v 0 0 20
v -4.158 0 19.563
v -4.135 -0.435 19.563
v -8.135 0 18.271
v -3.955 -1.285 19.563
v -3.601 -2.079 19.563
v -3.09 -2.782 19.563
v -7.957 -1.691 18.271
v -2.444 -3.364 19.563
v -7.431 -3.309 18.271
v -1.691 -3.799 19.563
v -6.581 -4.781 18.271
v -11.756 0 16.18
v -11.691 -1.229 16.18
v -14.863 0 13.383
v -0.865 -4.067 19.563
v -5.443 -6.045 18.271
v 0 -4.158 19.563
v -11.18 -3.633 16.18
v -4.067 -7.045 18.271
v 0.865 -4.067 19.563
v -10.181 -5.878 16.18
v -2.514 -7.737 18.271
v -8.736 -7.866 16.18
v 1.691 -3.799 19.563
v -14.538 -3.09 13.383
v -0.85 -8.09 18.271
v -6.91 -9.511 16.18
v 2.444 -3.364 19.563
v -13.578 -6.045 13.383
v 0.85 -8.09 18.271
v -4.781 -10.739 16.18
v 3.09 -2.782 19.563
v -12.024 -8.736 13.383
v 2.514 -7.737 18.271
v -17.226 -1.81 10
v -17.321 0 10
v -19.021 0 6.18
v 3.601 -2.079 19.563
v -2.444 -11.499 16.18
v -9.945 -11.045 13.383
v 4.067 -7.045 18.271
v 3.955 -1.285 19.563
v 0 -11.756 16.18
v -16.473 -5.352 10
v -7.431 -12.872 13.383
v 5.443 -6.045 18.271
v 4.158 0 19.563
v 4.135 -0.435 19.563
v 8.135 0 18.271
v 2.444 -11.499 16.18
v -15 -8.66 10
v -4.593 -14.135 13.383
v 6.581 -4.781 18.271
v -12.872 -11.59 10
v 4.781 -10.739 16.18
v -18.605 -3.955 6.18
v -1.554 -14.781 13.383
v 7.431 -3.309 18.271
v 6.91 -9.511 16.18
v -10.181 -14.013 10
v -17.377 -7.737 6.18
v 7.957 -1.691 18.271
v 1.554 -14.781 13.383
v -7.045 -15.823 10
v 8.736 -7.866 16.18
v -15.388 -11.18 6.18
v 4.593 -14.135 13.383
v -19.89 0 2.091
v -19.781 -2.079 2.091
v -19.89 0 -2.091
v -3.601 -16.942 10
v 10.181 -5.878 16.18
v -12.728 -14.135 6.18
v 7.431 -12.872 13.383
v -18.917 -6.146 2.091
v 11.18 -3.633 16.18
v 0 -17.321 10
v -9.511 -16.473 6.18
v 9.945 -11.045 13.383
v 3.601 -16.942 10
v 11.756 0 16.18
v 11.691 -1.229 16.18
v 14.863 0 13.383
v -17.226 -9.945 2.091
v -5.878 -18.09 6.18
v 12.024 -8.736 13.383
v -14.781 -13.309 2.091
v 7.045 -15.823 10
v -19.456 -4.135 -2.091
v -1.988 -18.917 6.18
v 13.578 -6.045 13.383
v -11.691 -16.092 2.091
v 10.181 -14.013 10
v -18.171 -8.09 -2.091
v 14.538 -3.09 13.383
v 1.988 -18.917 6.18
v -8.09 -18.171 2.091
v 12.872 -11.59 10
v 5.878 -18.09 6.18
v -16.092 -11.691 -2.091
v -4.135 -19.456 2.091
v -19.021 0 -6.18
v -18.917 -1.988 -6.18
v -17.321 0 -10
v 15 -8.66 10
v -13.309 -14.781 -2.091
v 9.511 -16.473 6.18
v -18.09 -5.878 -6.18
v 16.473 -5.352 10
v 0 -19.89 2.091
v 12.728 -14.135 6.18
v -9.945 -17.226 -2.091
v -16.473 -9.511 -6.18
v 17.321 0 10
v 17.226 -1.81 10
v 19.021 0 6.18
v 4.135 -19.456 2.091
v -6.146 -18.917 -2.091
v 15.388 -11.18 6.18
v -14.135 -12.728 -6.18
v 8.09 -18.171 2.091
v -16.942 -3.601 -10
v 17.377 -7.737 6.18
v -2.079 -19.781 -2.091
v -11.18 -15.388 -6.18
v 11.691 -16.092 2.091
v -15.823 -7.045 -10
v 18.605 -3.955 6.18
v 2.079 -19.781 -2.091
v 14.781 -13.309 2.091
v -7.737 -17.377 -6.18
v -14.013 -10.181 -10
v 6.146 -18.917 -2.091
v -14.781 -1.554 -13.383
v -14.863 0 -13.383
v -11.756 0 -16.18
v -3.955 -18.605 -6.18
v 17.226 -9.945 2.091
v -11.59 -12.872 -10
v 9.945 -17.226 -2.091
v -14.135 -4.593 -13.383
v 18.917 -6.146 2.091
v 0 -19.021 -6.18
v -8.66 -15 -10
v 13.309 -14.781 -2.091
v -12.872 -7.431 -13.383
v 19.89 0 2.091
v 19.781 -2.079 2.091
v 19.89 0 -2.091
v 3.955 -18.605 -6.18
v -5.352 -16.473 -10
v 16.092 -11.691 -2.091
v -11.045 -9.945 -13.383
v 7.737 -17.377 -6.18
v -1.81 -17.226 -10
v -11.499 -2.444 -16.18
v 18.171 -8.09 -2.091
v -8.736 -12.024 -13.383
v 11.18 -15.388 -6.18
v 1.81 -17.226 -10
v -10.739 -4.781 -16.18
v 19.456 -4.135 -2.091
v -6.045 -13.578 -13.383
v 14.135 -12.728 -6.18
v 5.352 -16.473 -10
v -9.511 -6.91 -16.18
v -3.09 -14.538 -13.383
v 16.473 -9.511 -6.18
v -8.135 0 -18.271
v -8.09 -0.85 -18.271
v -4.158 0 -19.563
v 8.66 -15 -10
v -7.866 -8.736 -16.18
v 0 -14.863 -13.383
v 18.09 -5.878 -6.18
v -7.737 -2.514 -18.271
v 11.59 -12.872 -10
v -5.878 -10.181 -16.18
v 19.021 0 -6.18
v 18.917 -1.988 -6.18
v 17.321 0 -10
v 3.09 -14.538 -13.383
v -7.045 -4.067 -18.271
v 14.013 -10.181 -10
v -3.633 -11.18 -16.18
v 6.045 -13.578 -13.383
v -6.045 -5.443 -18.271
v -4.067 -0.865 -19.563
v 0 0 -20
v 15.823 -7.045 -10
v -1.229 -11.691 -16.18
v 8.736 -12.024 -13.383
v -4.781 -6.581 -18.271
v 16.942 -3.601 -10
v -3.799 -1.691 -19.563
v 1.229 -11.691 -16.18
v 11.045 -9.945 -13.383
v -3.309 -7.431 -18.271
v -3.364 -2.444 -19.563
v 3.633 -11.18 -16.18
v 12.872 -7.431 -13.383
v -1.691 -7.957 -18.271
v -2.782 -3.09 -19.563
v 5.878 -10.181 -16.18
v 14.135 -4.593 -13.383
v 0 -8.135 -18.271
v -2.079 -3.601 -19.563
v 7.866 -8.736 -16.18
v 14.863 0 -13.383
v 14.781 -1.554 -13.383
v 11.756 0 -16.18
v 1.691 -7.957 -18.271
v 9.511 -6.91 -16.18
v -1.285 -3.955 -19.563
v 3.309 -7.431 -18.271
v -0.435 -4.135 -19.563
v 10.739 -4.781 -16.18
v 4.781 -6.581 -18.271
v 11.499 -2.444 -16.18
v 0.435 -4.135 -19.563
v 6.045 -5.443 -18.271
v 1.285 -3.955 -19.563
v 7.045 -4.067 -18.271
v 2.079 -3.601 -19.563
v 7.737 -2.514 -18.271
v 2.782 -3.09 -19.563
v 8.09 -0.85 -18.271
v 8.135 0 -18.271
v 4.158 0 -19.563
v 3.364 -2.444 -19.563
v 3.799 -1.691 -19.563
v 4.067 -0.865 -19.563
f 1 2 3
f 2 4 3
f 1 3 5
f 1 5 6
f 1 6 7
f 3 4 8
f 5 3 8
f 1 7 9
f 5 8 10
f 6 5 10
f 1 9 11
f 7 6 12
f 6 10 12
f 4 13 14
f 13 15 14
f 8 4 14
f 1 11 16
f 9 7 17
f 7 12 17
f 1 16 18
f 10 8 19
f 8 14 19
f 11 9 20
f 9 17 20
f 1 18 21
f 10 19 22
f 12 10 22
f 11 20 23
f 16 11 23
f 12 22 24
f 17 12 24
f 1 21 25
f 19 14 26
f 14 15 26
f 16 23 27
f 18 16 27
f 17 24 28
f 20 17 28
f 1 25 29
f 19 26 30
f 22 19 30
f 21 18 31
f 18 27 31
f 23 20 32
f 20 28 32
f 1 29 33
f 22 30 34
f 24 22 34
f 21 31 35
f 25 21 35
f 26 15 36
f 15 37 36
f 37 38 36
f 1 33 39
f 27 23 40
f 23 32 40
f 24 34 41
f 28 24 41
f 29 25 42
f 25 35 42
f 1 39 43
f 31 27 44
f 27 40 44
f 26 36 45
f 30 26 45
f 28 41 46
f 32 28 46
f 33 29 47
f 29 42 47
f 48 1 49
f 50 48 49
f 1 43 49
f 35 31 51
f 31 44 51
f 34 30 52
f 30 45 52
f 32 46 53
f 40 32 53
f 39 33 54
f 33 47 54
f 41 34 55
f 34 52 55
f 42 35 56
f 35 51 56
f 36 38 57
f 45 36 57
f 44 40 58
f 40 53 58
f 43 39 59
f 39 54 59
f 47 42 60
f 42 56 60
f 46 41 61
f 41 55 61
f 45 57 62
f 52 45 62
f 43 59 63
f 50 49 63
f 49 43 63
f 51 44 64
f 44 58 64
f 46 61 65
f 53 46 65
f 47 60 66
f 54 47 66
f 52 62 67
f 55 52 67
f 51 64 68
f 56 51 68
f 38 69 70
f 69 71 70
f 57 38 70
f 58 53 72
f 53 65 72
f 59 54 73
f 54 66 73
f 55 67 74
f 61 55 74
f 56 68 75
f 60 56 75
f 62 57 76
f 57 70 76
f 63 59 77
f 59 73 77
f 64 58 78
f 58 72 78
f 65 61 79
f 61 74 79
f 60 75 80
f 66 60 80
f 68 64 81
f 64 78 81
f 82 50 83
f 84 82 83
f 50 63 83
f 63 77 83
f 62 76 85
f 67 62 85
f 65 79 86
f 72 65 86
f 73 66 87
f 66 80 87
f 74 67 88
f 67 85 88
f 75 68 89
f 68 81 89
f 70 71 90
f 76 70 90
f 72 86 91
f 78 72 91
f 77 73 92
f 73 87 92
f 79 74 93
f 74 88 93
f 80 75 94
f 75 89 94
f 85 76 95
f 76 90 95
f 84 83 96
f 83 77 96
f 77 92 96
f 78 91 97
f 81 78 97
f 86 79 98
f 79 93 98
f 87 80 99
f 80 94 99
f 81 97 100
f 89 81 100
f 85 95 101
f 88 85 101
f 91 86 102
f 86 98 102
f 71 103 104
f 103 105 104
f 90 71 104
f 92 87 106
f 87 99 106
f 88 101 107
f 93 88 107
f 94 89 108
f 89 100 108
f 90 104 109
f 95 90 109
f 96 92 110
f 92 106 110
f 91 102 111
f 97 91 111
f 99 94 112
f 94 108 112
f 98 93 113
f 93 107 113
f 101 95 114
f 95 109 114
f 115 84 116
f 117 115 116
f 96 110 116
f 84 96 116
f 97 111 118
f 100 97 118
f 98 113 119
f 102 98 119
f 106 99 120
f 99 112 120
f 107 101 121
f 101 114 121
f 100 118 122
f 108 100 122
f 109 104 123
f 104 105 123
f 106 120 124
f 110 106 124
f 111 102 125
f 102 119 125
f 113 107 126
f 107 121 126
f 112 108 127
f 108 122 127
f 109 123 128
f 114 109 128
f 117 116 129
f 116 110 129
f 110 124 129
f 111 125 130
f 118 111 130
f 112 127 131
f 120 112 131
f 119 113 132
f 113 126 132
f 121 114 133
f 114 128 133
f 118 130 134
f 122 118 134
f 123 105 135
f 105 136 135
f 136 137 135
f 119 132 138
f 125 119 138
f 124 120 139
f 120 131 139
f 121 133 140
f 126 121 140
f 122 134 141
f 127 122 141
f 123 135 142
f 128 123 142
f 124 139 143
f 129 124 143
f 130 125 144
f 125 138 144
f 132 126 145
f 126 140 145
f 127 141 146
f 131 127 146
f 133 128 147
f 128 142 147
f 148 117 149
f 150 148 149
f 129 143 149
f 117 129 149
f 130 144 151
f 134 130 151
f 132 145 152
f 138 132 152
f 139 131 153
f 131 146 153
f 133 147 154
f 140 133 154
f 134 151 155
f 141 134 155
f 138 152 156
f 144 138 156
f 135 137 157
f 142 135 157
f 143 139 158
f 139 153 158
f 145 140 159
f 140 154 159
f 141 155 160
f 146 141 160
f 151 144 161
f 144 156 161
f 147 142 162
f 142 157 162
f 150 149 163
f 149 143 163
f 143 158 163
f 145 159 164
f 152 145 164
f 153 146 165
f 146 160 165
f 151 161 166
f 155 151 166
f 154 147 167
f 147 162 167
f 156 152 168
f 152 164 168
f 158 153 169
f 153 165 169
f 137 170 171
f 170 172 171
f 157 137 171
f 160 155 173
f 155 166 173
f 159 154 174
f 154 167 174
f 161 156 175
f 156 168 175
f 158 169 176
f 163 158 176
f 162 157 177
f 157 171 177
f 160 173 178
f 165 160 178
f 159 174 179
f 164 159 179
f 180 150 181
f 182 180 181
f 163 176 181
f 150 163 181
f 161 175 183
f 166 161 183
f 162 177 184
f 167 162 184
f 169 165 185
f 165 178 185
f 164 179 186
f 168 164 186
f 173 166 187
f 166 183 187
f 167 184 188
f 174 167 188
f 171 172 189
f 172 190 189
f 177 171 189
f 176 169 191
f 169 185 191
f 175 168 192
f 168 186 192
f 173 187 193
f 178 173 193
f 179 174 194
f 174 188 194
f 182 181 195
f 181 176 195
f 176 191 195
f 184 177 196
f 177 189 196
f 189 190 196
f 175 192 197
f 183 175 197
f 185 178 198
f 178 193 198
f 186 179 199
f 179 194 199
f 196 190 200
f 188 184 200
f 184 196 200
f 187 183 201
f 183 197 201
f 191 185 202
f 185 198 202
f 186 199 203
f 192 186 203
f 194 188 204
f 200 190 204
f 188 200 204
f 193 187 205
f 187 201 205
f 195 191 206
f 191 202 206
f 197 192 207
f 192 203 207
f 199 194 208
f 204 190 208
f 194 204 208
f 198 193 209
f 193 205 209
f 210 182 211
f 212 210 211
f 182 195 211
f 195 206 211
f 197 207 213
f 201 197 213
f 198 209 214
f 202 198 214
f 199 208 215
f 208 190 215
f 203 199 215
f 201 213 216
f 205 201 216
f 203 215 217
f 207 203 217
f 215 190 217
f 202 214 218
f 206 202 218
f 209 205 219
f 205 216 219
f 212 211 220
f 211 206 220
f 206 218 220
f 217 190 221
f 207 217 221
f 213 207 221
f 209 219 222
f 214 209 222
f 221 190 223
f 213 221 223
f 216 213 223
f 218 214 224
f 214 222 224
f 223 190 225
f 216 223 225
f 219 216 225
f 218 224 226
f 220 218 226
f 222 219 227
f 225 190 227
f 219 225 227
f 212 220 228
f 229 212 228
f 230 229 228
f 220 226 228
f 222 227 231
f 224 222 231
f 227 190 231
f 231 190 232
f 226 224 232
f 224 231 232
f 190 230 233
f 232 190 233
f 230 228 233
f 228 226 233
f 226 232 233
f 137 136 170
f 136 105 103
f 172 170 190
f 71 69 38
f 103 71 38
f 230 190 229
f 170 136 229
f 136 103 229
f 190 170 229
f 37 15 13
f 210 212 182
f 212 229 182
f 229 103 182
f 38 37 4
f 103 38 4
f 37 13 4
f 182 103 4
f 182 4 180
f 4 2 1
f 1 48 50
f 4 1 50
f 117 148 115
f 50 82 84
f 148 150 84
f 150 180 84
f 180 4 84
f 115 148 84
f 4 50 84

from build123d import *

# Parameters (mm, degrees)
F2_DEPTH = 24.5
F3_ANGLE = 180


with BuildPart() as f2:
    # F1 (on Front) → F2 (new body)
    with BuildSketch(Plane.XZ):
        Polygon((0, 19), (0, 0), (-19, 0), (-19, -0.75), (-0.75, -0.75), (-0.75, -19), (0.75, -19), (0.75, -0.75), (19, -0.75), (19, 0.75), (0.75, 0.75), (0.75, 19), align=None)
        Polygon((-19, 0), (0, 0), (0, 19), (-0.75, 19), (-0.75, 0.75), (-19, 0.75), align=None)
    extrude(amount=F2_DEPTH)


with BuildPart() as f3:
    # F0 (on Front) → F3 (revolve)
    with BuildSketch(Plane.XZ):
        with BuildLine():
            Line((0, -20), (0, 0))
            Line((0, 0), (0, 20))
            ThreePointArc((0, 20), (-20, 0), (0, -20))
        make_face()
    revolve(axis=Axis((0, 0, 10), (0, 0, 1)), revolution_arc=F3_ANGLE)


with BuildPart() as f2_1:
    add(f2.part)

    # F4: cut F3
    add(f3.part, mode=Mode.SUBTRACT)


solid = f3.part
